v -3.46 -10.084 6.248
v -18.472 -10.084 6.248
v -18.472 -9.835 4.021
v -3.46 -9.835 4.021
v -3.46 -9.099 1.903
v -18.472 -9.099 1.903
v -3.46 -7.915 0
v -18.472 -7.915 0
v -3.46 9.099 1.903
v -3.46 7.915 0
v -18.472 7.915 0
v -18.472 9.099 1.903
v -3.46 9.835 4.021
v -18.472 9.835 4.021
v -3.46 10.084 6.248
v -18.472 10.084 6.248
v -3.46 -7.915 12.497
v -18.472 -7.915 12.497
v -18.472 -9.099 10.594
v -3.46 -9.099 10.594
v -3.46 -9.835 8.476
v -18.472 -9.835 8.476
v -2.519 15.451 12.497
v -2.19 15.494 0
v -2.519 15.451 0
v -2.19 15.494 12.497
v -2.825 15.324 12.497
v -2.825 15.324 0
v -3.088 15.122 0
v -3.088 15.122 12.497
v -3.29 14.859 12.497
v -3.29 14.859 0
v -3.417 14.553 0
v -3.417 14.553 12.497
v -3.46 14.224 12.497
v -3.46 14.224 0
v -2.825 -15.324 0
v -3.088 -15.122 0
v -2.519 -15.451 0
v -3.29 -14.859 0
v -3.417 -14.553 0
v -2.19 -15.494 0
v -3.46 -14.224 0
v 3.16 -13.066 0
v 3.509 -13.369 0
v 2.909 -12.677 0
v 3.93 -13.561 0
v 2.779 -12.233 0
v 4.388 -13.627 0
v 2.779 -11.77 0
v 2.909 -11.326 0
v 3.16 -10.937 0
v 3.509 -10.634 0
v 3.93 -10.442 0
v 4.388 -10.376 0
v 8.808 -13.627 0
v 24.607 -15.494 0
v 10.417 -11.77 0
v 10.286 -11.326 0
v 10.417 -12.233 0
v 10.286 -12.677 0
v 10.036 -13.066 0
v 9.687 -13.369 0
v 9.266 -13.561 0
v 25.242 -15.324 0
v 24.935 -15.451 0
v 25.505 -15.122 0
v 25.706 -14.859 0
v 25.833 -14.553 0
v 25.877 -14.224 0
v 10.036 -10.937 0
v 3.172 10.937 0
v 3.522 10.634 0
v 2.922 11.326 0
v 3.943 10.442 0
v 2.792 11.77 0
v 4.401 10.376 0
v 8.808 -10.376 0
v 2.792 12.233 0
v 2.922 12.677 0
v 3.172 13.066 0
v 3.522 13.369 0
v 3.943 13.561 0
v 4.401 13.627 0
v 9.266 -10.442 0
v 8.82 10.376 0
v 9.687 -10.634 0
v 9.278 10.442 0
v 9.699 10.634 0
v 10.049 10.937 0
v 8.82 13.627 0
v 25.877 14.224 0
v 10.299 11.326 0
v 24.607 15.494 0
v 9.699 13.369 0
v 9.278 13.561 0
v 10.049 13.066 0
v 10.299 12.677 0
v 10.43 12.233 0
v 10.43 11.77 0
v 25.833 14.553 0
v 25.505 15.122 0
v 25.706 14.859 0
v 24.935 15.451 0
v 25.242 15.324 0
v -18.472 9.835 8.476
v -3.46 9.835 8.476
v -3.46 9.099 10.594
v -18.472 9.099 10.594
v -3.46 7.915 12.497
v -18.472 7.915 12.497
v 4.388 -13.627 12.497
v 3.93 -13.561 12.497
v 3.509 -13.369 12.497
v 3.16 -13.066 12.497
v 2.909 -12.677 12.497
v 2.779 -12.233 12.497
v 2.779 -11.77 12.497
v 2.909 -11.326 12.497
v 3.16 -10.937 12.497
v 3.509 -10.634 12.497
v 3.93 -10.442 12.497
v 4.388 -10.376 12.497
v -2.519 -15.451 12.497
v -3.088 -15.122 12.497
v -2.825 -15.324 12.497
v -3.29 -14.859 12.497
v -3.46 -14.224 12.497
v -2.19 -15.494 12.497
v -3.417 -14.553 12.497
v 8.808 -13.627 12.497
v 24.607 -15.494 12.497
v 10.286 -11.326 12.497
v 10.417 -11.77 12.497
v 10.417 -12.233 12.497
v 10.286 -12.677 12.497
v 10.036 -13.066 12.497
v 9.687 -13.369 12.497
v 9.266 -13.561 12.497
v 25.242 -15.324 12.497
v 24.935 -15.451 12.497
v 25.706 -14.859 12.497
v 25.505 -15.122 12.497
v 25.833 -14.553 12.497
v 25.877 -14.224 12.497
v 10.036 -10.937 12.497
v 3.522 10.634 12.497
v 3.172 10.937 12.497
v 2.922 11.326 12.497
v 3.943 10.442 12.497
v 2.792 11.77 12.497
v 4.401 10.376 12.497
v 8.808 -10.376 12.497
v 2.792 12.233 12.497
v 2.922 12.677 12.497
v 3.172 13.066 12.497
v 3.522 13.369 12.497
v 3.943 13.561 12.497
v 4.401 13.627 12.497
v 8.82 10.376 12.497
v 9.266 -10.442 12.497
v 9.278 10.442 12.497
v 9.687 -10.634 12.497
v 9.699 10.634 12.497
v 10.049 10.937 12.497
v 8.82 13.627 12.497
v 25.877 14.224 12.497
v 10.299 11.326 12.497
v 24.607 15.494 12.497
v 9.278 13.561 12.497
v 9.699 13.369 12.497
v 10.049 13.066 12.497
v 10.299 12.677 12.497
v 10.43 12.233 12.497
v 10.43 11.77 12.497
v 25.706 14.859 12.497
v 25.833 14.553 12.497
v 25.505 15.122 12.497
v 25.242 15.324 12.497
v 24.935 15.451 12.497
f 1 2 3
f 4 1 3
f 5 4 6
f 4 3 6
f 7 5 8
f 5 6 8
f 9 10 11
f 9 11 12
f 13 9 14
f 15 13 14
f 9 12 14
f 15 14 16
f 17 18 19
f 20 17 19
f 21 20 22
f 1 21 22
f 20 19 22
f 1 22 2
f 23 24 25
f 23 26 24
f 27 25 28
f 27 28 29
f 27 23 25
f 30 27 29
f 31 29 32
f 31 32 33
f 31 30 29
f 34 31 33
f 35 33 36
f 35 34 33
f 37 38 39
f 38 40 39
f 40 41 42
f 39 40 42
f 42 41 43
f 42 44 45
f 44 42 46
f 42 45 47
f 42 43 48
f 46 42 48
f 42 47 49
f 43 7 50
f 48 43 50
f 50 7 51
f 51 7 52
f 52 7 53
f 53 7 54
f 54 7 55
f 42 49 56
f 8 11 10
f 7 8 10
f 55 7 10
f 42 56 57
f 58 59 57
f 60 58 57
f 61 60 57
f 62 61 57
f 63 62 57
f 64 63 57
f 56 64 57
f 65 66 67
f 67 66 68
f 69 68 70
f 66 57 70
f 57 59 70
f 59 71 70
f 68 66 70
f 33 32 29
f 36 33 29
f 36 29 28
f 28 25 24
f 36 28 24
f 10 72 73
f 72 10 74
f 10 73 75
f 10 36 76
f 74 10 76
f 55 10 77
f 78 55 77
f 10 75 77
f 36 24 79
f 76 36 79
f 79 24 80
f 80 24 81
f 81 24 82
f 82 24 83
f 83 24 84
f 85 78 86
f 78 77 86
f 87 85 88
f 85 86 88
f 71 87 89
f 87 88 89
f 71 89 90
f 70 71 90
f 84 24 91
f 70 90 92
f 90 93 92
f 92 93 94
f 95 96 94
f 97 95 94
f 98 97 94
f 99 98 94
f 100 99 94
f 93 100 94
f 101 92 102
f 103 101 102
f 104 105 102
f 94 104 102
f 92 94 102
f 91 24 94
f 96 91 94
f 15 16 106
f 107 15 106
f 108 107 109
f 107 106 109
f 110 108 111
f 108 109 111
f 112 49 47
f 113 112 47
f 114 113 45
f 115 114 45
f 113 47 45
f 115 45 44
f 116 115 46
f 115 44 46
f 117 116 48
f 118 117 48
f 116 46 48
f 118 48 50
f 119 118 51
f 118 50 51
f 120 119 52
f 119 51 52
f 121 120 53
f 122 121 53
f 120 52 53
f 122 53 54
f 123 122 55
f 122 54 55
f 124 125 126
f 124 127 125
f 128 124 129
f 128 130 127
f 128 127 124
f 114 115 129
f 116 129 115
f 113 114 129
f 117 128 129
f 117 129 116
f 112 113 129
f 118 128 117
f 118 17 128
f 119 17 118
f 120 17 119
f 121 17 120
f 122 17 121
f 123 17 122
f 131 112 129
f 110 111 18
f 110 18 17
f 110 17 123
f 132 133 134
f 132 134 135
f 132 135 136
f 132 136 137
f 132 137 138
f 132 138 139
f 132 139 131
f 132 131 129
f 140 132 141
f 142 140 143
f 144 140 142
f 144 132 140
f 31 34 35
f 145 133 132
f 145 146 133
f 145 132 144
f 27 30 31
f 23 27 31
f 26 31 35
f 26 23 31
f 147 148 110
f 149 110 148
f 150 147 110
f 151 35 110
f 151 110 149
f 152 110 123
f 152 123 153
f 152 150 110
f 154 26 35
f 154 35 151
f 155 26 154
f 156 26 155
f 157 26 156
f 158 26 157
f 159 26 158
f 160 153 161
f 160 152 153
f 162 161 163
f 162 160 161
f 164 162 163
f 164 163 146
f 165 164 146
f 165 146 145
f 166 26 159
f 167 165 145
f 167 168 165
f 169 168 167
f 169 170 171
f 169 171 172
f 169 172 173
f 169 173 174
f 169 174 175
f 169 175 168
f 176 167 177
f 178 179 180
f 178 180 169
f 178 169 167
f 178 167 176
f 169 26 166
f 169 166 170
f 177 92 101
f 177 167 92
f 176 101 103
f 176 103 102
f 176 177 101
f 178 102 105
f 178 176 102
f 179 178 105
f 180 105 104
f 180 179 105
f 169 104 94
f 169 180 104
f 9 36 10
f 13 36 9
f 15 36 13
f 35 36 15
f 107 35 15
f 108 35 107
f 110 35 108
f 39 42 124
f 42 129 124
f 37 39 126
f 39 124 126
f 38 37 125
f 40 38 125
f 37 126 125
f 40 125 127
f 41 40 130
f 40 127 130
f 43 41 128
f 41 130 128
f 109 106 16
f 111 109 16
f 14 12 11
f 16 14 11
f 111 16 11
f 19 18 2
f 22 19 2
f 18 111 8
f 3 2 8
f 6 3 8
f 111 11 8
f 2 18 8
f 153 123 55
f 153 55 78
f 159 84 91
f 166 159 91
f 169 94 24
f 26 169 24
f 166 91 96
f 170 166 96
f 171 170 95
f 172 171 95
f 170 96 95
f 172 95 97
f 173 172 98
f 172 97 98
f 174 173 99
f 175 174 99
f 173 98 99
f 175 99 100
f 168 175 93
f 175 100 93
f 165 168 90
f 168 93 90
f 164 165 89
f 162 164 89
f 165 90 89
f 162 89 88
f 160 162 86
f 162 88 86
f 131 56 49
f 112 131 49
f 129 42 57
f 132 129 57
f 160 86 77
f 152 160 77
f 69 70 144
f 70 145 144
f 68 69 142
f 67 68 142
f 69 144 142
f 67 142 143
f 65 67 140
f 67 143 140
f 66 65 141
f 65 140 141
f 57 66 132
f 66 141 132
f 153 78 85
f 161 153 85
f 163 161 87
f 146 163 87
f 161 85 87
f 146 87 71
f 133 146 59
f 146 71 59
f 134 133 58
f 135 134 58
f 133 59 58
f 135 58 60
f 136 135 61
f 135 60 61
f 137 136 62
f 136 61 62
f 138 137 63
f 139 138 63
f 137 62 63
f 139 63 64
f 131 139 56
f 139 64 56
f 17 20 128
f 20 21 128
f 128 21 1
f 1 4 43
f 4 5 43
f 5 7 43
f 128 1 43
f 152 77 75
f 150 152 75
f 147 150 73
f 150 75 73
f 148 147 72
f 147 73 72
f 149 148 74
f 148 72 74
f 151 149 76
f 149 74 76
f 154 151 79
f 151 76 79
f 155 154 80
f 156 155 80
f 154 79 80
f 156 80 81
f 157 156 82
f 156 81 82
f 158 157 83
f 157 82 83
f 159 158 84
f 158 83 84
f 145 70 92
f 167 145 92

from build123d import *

# Parameters (mm, degrees)
F1_DEPTH = 12.4968
F3_R     = 1.27
F4_DEPTH = 15.0114


with BuildPart() as f1:
    # F0 (on Top) → F1 (new body)
    with BuildSketch(Plane.XY):
        Polygon((25.8765831087, -15.494), (25.8765831087, 15.494), (-3.4604168913, 15.494), (-3.4604168913, 10.0838), (-18.4718168913, 10.0838), (-18.4718168913, -10.0838), (-3.4604168913, -10.0838), (-3.4604168913, -15.494), align=None)
        with BuildLine():
            ThreePointArc((4.3881831087, -13.6271), (2.7625831087, -12.0015), (4.3881831087, -10.3759))
            Line((4.3881831087, -10.3759), (8.8077831087, -10.3759))
            ThreePointArc((8.8077831087, -10.3759), (10.4333831087, -12.0015), (8.8077831087, -13.6271))
            Line((8.8077831087, -13.6271), (4.3881831087, -13.6271))
        make_face(mode=Mode.SUBTRACT)
        with BuildLine():
            ThreePointArc((4.4008831087, 10.3759), (2.7752831087, 12.0015), (4.4008831087, 13.6271))
            Line((4.4008831087, 13.6271), (8.8204831087, 13.6271))
            ThreePointArc((8.8204831087, 13.6271), (10.4460831087, 12.0015), (8.8204831087, 10.3759))
            Line((8.8204831087, 10.3759), (4.4008831087, 10.3759))
        make_face(mode=Mode.SUBTRACT)
    extrude(amount=F1_DEPTH)

    # F3
    f3_edges = [f1.edges().sort_by_distance(p)[0] for p in [
        (-3.460417, -15.494, 6.2484),
        (-3.460417, 15.494, 6.2484),
        (25.876583, -15.494, 6.2484),
        (25.876583, 15.494, 6.2484),
    ]]
    fillet(f3_edges, radius=F3_R)

    # F2 (on face) → F4 (cut)
    with BuildSketch(Plane(origin=(-18.4718168913, 0, 0), x_dir=(0, -1, 0), z_dir=(-1, 0, 0))):
        with BuildLine():
            Line((10.0838, 0), (10.0838, 6.2484))
            ThreePointArc((10.0838, 6.2484), (9.5260702319, 2.9412851884), (7.9145764182, 0))
            Line((7.9145764182, 0), (10.0838, 0))
        make_face()
        with BuildLine():
            ThreePointArc((7.9145764182, 12.4968), (9.5260702319, 9.5555148116), (10.0838, 6.2484))
            Line((10.0838, 6.2484), (10.0838, 12.4968))
            Line((10.0838, 12.4968), (7.9145764182, 12.4968))
        make_face()
        with BuildLine():
            ThreePointArc((-7.9145764182, 0), (0, -3.8354), (7.9145764182, 0))
            Line((7.9145764182, 0), (-7.9145764182, 0))
        make_face()
        with BuildLine():
            ThreePointArc((-10.0838, 6.2484), (-9.5260702319, 9.5555148116), (-7.9145764182, 12.4968))
            Line((-7.9145764182, 12.4968), (-10.0838, 12.4968))
            Line((-10.0838, 12.4968), (-10.0838, 6.2484))
        make_face()
        with BuildLine():
            Line((-10.0838, 0), (-7.9145764182, 0))
            ThreePointArc((-7.9145764182, 0), (-9.5260702319, 2.9412851884), (-10.0838, 6.2484))
            Line((-10.0838, 6.2484), (-10.0838, 0))
        make_face()
    extrude(amount=-F4_DEPTH, mode=Mode.SUBTRACT)


solid = f1.part
